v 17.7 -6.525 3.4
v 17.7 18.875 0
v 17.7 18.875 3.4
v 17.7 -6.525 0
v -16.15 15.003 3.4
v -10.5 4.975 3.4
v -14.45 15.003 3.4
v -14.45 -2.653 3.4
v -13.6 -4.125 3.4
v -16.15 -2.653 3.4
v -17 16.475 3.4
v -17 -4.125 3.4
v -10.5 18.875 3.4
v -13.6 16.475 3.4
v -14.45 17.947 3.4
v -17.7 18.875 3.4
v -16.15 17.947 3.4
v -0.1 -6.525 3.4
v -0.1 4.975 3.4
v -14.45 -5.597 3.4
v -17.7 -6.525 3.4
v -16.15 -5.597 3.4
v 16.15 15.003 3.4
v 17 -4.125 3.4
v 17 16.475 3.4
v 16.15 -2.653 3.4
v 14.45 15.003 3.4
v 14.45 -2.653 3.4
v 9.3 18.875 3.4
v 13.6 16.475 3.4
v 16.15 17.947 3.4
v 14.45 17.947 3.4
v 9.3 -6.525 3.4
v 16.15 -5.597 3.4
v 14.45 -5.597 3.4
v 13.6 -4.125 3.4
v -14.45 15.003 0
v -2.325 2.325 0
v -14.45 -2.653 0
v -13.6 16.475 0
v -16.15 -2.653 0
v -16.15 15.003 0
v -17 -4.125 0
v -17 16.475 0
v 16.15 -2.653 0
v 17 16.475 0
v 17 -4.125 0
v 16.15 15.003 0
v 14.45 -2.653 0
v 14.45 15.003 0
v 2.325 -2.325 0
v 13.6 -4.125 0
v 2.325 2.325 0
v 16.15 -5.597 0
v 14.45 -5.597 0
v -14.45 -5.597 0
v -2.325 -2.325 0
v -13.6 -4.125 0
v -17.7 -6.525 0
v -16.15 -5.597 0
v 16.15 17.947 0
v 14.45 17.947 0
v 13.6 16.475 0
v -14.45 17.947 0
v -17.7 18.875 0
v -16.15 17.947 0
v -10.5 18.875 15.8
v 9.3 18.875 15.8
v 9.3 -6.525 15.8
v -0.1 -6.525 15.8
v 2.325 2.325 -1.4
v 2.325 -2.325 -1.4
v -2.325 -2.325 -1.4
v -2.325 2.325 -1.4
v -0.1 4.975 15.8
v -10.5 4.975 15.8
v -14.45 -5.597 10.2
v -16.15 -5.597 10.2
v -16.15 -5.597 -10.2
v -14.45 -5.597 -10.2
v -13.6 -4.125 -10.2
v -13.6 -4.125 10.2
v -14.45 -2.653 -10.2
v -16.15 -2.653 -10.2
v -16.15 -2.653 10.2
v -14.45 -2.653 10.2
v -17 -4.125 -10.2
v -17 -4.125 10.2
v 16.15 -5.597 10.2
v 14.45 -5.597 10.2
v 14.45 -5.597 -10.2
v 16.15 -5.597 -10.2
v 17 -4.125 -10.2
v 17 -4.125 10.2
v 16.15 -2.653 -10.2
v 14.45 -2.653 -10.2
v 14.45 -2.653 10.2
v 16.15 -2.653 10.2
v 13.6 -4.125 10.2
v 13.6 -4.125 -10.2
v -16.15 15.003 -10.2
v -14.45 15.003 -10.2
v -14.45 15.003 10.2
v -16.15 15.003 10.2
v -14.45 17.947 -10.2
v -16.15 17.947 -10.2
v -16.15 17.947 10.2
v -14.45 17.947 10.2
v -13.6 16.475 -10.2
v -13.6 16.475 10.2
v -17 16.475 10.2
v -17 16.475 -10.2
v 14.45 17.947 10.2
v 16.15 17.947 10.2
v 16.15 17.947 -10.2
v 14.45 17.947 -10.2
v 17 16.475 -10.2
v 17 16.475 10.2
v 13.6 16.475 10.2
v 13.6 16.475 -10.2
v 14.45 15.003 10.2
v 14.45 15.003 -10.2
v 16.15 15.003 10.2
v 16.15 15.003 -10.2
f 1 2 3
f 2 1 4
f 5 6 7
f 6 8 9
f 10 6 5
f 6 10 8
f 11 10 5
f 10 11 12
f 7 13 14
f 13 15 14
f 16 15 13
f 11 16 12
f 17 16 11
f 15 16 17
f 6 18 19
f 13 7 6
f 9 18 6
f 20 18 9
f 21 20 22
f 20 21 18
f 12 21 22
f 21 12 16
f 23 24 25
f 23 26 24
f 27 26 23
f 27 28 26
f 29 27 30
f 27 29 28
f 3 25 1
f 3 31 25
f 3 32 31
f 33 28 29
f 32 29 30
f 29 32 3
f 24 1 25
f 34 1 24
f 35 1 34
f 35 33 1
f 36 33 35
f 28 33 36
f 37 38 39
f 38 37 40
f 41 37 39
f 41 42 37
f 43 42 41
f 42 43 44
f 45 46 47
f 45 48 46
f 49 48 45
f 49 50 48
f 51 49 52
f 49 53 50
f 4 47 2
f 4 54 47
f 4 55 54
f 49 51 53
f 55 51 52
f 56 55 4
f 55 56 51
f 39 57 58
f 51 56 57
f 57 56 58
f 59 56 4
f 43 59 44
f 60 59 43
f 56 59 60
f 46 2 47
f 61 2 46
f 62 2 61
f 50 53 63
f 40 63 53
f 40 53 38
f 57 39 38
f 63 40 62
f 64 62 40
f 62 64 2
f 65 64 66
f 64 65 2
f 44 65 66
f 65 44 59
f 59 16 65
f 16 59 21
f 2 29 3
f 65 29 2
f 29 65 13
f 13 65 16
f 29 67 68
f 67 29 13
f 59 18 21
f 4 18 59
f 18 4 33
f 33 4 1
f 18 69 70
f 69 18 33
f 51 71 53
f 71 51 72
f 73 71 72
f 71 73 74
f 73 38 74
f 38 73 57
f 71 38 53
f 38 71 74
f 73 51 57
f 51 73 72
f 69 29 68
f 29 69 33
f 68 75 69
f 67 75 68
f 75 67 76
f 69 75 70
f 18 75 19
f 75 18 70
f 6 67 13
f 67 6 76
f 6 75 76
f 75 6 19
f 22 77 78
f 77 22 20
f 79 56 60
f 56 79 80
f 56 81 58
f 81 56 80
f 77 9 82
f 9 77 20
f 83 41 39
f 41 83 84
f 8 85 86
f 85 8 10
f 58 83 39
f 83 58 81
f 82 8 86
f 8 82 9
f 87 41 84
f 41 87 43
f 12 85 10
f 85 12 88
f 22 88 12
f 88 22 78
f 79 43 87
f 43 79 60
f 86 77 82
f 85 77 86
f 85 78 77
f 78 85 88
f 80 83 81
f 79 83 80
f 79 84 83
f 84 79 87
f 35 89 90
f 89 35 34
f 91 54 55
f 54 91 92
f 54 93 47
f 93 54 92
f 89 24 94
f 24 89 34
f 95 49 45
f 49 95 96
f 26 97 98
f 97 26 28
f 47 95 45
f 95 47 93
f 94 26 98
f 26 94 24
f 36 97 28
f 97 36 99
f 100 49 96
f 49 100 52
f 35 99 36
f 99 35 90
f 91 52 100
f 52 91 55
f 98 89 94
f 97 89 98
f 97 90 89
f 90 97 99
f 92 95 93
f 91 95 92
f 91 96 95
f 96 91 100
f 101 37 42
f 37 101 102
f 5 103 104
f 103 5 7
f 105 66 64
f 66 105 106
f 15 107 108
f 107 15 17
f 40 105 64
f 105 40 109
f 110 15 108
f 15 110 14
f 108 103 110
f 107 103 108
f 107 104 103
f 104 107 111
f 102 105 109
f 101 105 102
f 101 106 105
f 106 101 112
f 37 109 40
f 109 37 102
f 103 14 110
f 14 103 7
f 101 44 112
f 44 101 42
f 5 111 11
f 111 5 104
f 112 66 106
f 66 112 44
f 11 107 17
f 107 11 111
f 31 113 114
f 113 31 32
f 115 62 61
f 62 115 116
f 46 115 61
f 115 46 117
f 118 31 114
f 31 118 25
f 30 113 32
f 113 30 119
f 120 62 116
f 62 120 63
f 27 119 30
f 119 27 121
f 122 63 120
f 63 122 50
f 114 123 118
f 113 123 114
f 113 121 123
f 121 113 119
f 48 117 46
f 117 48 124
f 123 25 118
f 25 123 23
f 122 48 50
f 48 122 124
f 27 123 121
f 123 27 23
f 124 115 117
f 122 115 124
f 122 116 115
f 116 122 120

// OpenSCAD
function EncoderWidth()=35;
function EncoderHeight()=25;
function EncoderThickness()=3;

function EncoderBoltWidth()=3;
function EncoderBoltLength()=20;
function EncoderBoltInset()=2.2;

function EncoderLongBoxWidth()=9;

function EncoderShortBoxWidth()=10;
function EncoderShortBoxLength()=13.5;
function EncoderShortBoxInset()=7;

function EncoderBoxHeight()=9+EncoderThickness();

function EncoderChipSide()=4.25;
function EncoderChipHeight()= 1;
function EncoderChipOffset()=4;

3dPrinterTolerance=.4;


module Encoder(3dPrinterTolerance=.4)
{

EncoderWidth=EncoderWidth() + 3dPrinterTolerance;
EncoderHeight=EncoderHeight() + 3dPrinterTolerance;
EncoderThickness=EncoderThickness() + 3dPrinterTolerance;

EncoderBoltWidth=EncoderBoltWidth() + 3dPrinterTolerance;
EncoderBoltLength=EncoderBoltLength() + 3dPrinterTolerance;
EncoderBoltInset=EncoderBoltInset() + 3dPrinterTolerance/2;

EncoderLongBoxWidth=EncoderLongBoxWidth() + 3dPrinterTolerance;

EncoderShortBoxWidth=EncoderShortBoxWidth() + 3dPrinterTolerance;
EncoderShortBoxLength=EncoderShortBoxLength() + 3dPrinterTolerance;
EncoderShortBoxInset=EncoderShortBoxInset() + 3dPrinterTolerance/2;

EncoderBoxHeight=EncoderBoxHeight()+EncoderThickness + 3dPrinterTolerance;

EncoderChipSide=EncoderChipSide() + 3dPrinterTolerance;
EncoderChipHeight=EncoderChipHeight() + 3dPrinterTolerance;
EncoderChipOffset=EncoderChipOffset() + 3dPrinterTolerance/2;

	//centers the encoder on the chip, which is the important part
	translate([-EncoderWidth/2,-EncoderChipOffset-EncoderChipSide/2,0])
	{
		union()
		{
	//base
			cube([EncoderWidth, EncoderHeight, EncoderThickness]);
	//chip
			translate([EncoderWidth/2-EncoderChipSide/2, EncoderChipOffset, -EncoderChipHeight])
			{
				cube([EncoderChipSide, EncoderChipSide,EncoderChipHeight]);
			}
	//boxes
			translate([EncoderShortBoxInset+EncoderShortBoxWidth,0,0])
			{
				cube([EncoderLongBoxWidth, EncoderHeight, EncoderBoxHeight]);
			}
			translate([EncoderShortBoxInset,EncoderHeight-EncoderShortBoxLength,0])
			{ 
				cube([EncoderShortBoxWidth, EncoderShortBoxLength, EncoderBoxHeight]);
			}
	//screws
			translate([EncoderBoltInset,EncoderBoltInset,-EncoderBoltLength/2])
			{
				cylinder(EncoderBoltLength, EncoderBoltWidth/2, EncoderBoltWidth/2);
			}
			translate([EncoderWidth-EncoderBoltInset,EncoderBoltInset,-EncoderBoltLength/2])
			{
				cylinder(EncoderBoltLength, EncoderBoltWidth/2, EncoderBoltWidth/2);
			}
			translate([EncoderBoltInset,EncoderHeight-EncoderBoltInset,-EncoderBoltLength/2])
			{
				cylinder(EncoderBoltLength, EncoderBoltWidth/2, EncoderBoltWidth/2);
			}
			translate([EncoderWidth-EncoderBoltInset,EncoderHeight-EncoderBoltInset,-EncoderBoltLength/2])
			{
				cylinder(EncoderBoltLength, EncoderBoltWidth/2, EncoderBoltWidth/2);
			}
		}
	}
}

Encoder();
